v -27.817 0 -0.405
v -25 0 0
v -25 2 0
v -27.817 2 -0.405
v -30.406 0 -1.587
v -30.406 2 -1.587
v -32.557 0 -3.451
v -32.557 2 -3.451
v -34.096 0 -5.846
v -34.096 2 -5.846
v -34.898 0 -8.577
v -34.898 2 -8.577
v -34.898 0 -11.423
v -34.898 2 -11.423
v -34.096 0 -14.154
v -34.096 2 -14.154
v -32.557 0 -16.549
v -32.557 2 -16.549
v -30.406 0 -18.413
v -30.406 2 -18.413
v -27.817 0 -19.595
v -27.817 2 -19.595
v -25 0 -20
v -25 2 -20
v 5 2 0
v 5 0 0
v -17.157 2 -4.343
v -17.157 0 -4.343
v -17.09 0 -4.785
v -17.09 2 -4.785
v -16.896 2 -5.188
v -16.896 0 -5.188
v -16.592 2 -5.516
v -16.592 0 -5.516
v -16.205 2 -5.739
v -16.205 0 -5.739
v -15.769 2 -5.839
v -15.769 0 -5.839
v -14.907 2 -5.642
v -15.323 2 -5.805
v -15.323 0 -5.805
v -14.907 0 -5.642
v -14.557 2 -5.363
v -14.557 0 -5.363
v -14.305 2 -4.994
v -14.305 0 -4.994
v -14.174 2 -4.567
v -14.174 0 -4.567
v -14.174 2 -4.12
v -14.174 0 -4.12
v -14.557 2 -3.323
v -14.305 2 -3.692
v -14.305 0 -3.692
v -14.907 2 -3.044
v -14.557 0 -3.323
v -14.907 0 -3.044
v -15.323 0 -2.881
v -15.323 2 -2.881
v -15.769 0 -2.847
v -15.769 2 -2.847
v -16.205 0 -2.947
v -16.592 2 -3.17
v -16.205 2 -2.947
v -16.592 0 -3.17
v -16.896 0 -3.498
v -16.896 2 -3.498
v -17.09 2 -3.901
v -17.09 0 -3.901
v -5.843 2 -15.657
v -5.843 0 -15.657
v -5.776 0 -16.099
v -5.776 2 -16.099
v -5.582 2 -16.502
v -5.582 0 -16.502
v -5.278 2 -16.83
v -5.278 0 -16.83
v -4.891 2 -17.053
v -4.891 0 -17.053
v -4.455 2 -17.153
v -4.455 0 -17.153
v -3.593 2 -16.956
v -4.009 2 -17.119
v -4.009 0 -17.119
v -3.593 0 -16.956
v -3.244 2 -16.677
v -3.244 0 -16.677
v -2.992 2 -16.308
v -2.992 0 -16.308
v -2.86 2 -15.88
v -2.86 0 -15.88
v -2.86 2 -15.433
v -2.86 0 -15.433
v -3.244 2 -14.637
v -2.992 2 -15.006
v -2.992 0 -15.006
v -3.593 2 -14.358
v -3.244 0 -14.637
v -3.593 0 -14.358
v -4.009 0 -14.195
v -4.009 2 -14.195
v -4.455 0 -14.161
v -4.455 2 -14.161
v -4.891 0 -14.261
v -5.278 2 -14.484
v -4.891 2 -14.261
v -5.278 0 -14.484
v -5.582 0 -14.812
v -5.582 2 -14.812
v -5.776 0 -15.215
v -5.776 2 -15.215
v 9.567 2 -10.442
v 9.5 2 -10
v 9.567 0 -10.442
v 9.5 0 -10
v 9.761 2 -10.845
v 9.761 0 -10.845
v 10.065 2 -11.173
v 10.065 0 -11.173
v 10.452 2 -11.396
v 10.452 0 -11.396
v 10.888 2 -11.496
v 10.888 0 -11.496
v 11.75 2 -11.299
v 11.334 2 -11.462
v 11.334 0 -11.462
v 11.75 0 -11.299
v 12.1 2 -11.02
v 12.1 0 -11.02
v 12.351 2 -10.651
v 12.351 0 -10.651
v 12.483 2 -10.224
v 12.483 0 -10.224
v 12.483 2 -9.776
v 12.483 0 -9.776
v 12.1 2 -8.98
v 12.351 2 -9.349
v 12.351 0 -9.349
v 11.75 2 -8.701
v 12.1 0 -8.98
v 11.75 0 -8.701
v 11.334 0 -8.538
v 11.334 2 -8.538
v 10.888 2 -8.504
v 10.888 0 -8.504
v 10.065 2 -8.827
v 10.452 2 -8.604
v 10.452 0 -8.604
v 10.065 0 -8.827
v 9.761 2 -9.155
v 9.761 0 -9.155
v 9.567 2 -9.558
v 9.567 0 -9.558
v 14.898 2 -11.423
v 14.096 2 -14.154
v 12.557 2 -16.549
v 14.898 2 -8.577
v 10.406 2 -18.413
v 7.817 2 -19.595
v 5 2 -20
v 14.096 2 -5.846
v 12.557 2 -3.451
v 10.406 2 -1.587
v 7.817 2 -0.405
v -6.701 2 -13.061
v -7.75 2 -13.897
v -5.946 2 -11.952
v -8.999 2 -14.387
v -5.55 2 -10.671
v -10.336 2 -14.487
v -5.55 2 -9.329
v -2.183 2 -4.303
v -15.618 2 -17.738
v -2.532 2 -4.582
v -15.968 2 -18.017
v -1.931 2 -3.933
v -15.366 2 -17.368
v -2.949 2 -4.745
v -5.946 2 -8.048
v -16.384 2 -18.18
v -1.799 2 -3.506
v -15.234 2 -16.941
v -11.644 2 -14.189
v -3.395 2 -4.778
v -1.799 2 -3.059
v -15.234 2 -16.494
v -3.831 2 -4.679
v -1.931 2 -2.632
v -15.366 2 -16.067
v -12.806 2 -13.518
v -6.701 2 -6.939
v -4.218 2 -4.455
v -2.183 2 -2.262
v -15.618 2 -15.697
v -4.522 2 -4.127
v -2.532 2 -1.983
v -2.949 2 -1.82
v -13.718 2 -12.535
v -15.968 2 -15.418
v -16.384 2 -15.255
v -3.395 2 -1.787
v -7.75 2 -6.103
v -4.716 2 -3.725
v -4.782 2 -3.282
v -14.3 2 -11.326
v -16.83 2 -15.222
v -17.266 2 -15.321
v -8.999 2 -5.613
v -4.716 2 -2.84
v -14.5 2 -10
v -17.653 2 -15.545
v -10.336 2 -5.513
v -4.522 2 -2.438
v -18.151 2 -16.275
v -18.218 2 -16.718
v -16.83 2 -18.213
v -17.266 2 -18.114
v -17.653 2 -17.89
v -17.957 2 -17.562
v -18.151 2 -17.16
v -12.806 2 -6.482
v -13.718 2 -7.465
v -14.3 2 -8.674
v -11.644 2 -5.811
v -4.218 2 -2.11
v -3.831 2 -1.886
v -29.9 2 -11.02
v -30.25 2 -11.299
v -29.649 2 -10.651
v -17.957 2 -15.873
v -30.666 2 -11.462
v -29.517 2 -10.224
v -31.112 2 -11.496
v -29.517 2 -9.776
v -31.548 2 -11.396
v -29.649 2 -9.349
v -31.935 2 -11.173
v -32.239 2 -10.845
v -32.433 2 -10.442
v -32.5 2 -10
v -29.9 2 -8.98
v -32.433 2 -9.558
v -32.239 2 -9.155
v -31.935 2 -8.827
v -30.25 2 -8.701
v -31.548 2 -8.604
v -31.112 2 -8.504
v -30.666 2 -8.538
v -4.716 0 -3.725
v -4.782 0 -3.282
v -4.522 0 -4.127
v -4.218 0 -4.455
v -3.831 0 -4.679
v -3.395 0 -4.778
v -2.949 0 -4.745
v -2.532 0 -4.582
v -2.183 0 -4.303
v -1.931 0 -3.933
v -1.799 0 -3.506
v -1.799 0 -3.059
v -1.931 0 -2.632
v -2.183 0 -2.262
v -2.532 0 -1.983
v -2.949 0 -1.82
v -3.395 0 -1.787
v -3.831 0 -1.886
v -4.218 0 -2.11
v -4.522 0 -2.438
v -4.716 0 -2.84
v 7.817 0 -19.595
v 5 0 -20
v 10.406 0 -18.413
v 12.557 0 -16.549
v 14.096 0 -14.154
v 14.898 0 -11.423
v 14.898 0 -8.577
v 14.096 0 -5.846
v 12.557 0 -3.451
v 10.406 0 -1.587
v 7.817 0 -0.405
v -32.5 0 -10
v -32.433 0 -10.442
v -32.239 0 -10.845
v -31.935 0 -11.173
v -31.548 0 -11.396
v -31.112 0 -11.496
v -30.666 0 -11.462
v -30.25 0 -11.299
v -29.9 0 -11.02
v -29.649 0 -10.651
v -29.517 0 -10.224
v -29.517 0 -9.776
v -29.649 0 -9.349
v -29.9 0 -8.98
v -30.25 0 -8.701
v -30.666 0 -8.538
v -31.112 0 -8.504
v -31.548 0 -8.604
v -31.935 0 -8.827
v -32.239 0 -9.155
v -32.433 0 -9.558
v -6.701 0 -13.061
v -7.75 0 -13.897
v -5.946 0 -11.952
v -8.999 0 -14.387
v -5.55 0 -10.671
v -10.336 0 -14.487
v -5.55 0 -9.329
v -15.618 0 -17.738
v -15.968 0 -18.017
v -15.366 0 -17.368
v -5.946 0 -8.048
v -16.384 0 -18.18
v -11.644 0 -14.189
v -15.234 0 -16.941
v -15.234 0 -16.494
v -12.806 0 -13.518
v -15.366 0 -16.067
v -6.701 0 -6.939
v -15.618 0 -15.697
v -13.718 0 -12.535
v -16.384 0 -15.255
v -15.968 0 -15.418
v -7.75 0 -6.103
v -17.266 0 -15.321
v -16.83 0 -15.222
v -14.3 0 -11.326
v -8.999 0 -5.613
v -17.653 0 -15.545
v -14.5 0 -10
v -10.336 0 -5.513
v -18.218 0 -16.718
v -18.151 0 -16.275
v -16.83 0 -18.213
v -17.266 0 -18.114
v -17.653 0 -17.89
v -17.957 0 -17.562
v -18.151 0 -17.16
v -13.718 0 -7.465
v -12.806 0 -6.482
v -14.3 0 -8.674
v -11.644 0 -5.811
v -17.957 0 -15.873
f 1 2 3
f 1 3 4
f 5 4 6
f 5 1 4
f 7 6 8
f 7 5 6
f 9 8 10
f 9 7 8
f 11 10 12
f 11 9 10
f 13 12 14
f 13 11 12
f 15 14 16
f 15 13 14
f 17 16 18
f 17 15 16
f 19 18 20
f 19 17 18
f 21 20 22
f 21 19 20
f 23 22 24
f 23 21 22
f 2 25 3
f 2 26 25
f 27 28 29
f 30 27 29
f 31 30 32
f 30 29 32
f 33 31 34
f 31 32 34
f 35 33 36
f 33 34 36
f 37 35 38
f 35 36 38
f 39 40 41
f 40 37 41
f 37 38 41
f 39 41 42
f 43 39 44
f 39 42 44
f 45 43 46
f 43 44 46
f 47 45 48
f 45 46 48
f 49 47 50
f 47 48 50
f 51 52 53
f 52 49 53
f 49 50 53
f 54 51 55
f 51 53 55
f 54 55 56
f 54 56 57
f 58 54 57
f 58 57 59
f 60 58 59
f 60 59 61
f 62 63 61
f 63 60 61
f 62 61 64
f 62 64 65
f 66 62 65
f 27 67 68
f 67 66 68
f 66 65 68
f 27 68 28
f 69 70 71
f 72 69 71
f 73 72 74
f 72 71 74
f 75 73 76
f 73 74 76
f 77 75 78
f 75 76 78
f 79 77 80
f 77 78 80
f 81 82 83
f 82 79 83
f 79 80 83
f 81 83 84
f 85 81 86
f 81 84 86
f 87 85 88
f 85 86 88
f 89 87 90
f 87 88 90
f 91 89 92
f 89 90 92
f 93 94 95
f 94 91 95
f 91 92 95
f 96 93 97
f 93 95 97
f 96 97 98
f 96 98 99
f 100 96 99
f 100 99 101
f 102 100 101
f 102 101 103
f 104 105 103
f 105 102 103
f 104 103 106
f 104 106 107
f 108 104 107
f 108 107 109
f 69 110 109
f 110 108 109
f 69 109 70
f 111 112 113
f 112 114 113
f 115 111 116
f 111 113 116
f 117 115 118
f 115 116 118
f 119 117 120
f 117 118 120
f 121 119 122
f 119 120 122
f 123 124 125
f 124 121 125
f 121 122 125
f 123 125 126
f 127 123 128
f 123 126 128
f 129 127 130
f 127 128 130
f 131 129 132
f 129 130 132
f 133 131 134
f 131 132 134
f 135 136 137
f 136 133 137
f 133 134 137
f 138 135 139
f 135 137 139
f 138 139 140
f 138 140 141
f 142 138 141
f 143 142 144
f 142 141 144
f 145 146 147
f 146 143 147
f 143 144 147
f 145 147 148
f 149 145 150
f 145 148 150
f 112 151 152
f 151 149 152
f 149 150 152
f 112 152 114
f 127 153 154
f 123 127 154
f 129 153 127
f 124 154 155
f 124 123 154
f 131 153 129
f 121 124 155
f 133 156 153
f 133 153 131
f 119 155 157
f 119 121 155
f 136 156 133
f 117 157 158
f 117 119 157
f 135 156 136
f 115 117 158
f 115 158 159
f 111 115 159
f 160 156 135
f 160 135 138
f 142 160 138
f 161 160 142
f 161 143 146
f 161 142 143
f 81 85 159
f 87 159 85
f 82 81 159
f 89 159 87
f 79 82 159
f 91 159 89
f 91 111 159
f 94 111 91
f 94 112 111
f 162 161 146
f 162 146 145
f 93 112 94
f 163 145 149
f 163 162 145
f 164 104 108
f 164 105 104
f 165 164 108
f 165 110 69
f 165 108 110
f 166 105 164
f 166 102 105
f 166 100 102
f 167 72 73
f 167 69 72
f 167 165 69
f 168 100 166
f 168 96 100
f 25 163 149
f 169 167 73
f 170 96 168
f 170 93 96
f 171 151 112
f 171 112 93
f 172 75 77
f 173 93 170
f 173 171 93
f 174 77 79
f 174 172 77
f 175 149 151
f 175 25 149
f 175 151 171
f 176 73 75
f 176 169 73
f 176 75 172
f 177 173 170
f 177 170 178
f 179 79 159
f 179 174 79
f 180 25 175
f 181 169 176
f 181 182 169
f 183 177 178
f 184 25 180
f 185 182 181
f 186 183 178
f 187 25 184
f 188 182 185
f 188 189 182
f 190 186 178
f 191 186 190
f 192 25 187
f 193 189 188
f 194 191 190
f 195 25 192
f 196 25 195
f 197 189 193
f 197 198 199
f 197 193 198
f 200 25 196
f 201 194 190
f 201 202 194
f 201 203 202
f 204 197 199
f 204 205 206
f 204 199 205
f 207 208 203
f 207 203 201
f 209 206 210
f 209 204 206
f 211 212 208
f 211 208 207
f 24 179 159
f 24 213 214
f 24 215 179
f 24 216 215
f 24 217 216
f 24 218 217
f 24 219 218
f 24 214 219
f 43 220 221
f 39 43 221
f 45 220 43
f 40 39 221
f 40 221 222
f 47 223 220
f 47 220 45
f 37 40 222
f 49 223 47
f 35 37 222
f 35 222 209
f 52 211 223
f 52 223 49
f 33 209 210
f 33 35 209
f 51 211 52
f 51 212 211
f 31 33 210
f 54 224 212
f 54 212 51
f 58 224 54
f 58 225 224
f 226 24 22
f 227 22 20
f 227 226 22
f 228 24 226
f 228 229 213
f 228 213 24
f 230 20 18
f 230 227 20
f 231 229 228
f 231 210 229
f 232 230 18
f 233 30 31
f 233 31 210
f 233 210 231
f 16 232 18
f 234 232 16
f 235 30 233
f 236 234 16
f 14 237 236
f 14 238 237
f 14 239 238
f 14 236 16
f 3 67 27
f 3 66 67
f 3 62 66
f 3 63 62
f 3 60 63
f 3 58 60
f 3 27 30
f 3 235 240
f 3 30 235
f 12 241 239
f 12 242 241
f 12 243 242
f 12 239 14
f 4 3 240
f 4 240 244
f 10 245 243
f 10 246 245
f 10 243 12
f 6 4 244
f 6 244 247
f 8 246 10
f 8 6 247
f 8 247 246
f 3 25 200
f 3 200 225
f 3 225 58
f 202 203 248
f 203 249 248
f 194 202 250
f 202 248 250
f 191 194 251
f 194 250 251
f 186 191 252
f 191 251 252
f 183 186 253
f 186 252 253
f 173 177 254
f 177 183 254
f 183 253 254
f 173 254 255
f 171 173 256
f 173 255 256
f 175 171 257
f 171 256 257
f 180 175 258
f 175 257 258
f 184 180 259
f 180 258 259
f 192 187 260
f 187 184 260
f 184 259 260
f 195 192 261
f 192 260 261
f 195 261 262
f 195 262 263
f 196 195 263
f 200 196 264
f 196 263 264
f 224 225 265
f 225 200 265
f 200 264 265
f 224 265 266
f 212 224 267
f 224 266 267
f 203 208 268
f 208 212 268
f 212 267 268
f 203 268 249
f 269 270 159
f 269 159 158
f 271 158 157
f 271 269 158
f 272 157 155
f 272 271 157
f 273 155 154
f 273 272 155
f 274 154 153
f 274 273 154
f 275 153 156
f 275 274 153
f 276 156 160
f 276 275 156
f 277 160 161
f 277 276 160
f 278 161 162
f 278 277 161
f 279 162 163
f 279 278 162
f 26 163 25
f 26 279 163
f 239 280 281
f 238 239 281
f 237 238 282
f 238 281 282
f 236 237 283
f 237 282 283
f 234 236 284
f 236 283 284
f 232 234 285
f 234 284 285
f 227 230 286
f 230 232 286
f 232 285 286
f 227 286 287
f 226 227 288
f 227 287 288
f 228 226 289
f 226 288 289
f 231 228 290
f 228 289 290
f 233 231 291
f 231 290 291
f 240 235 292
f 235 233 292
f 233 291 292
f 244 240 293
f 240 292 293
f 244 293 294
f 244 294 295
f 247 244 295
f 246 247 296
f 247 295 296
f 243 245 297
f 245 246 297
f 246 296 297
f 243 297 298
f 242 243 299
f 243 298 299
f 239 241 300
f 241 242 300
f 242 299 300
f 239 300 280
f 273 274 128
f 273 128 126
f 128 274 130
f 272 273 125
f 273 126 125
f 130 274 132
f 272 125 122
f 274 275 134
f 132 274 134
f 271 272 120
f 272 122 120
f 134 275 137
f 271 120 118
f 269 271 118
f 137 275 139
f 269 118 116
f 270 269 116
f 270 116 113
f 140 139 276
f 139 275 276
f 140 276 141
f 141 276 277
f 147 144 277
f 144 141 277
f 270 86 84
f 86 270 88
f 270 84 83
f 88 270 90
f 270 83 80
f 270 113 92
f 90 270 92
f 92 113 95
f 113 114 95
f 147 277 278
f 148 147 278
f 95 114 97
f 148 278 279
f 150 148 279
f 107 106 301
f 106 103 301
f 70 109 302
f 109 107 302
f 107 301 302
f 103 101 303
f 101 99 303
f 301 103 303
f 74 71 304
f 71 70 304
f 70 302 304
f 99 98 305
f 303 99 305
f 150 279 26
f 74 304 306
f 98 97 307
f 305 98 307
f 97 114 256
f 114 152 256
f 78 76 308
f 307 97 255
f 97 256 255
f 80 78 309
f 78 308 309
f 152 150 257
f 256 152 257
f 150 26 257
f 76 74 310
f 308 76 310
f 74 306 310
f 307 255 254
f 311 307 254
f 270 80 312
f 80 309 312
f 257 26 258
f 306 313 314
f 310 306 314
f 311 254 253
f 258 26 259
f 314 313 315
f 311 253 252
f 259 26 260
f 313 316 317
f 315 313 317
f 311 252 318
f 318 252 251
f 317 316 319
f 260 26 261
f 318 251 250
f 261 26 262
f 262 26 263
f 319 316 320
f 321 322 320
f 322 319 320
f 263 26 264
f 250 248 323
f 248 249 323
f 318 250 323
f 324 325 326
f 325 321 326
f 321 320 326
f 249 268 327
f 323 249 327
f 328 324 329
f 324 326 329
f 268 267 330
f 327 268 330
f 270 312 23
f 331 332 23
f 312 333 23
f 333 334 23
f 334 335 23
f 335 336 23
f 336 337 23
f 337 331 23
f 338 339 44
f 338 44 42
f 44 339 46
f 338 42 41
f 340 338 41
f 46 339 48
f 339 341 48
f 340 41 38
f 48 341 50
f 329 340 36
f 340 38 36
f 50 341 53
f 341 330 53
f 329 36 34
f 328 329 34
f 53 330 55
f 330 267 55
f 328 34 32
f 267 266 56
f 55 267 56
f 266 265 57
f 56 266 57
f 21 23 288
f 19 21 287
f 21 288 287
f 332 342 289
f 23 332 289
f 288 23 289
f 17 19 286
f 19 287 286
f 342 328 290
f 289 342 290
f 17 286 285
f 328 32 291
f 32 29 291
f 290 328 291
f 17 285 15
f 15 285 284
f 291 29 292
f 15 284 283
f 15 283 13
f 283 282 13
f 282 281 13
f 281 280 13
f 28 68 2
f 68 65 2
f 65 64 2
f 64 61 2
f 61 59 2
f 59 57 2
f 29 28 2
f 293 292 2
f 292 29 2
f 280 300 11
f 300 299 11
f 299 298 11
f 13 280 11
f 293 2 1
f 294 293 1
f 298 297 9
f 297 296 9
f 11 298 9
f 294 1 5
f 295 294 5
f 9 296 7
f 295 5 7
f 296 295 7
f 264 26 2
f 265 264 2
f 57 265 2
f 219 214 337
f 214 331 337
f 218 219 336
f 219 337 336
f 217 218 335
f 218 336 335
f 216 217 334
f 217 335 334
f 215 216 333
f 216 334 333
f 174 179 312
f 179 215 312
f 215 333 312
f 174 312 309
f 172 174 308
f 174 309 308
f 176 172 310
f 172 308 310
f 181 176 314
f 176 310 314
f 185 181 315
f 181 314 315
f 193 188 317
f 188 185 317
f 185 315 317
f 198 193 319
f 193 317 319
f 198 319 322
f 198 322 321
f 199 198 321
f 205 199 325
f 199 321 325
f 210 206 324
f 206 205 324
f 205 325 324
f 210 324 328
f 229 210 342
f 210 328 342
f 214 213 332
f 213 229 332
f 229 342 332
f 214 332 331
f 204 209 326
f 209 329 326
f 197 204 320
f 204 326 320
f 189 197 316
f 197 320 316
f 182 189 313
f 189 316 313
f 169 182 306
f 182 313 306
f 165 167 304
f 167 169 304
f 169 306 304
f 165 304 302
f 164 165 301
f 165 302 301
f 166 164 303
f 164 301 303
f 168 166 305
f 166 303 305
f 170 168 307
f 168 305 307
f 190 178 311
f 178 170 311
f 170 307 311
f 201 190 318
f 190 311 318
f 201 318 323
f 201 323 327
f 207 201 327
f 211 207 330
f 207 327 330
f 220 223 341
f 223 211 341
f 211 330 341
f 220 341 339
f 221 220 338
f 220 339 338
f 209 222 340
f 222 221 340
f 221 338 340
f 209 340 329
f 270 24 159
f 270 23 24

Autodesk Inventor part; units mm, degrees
ref_plane "YZ Plane" through (0, 0, 0) normal (1, 0, 0) x (0, 1, 0)
ref_plane "XZ Plane" through (0, 0, 0) normal (0, 1, 0) x (-1, 0, 0)
ref_plane "XY Plane" through (0, 0, 0) normal (0, 0, 1) x (1, 0, 0)
sketch "Sketch2" plane through (0, 0, 0) normal (0, 1, 0) x (-1, 0, 0)
  line L0 (0, 0) -> (20, 0)
  line L1 (20, 0) -> (20, -20)
  line L2 (20, -20) -> (0, -20)
  line L3 (0, -20) -> (0, 0)
  line L4 (20, 0) -> (0, -20) construction
  line L5 (20, -20) -> (0, 0) construction
  circle A0 centre (15.6569, -4.3431) radius 1.5
  circle A1 centre (16.7175, -16.7175) radius 1.5
  circle A2 centre (3.2825, -3.2825) radius 1.5
  circle A3 centre (4.3431, -15.6569) radius 1.5
  circle A4 centre (10, -10) radius 4.5
  line L6 (20, -20) -> (25, -20)
  line L7 (25, -20) -> (25, 0)
  line L8 (25, 0) -> (20, 0)
  line L9 (20, 0) -> (20, -20)
  line L10 (0, -20) -> (-5, -20)
  line L11 (-5, -20) -> (-5, 0)
  line L12 (-5, 0) -> (0, 0)
  line L13 (0, 0) -> (0, -20)
  arc A5 (25, -20) -> (25, 0) centre (25, -10) ccw
  arc A6 (-5, 0) -> (-5, -20) centre (-5, -10) ccw
  circle A7 centre (31, -10) radius 1.5
  circle A8 centre (-11, -10) radius 1.5
  dimension "d37" = 3
  dimension "d38" = 3
  dimension "d39" = 3
  dimension "d40" = 3
  dimension "d41" = 9.5
  dimension "d42" = 9.5
  dimension "d43" = 8
  dimension "d44" = 8
  dimension "d60" = 20
  dimension "d61" = 9
  dimension "d66" = 5
  dimension "d67" = 5
  dimension "d68" = 3
  dimension "d69" = 3
  dimension "d70" = 6
  dimension "d71" = 6
extrude "Extrusion2" add sketch "Sketch2" along normal blind 2
sketch "Sketch3" plane through (0, 2, 0) normal (0, 1, 0) x (1, 0, 0)
  line L0 (5, 20) -> (-25, 20) projected
  arc A0 (-25, 20) -> (-25, 0) centre (-25, 10) ccw projected
  line L1 (-25, 0) -> (5, 0) projected
  arc A1 (5, 0) -> (5, 20) centre (5, 10) ccw projected
  circle A2 centre (-16.7175, 16.7175) radius 1.5 projected
  circle A3 centre (-3.2825, 3.2825) radius 1.5 projected
  circle A4 centre (-10, 10) radius 4.5 projected
  circle A5 centre (-4.3431, 15.6569) radius 1.5 projected
  circle A6 centre (-15.6569, 4.3431) radius 1.5 projected
  circle A7 centre (-31, 10) radius 1.5 projected
  circle A8 centre (11, 10) radius 1.5 projected
  point P0 (0, 0)
properties part number "Motor_mount_plate"
